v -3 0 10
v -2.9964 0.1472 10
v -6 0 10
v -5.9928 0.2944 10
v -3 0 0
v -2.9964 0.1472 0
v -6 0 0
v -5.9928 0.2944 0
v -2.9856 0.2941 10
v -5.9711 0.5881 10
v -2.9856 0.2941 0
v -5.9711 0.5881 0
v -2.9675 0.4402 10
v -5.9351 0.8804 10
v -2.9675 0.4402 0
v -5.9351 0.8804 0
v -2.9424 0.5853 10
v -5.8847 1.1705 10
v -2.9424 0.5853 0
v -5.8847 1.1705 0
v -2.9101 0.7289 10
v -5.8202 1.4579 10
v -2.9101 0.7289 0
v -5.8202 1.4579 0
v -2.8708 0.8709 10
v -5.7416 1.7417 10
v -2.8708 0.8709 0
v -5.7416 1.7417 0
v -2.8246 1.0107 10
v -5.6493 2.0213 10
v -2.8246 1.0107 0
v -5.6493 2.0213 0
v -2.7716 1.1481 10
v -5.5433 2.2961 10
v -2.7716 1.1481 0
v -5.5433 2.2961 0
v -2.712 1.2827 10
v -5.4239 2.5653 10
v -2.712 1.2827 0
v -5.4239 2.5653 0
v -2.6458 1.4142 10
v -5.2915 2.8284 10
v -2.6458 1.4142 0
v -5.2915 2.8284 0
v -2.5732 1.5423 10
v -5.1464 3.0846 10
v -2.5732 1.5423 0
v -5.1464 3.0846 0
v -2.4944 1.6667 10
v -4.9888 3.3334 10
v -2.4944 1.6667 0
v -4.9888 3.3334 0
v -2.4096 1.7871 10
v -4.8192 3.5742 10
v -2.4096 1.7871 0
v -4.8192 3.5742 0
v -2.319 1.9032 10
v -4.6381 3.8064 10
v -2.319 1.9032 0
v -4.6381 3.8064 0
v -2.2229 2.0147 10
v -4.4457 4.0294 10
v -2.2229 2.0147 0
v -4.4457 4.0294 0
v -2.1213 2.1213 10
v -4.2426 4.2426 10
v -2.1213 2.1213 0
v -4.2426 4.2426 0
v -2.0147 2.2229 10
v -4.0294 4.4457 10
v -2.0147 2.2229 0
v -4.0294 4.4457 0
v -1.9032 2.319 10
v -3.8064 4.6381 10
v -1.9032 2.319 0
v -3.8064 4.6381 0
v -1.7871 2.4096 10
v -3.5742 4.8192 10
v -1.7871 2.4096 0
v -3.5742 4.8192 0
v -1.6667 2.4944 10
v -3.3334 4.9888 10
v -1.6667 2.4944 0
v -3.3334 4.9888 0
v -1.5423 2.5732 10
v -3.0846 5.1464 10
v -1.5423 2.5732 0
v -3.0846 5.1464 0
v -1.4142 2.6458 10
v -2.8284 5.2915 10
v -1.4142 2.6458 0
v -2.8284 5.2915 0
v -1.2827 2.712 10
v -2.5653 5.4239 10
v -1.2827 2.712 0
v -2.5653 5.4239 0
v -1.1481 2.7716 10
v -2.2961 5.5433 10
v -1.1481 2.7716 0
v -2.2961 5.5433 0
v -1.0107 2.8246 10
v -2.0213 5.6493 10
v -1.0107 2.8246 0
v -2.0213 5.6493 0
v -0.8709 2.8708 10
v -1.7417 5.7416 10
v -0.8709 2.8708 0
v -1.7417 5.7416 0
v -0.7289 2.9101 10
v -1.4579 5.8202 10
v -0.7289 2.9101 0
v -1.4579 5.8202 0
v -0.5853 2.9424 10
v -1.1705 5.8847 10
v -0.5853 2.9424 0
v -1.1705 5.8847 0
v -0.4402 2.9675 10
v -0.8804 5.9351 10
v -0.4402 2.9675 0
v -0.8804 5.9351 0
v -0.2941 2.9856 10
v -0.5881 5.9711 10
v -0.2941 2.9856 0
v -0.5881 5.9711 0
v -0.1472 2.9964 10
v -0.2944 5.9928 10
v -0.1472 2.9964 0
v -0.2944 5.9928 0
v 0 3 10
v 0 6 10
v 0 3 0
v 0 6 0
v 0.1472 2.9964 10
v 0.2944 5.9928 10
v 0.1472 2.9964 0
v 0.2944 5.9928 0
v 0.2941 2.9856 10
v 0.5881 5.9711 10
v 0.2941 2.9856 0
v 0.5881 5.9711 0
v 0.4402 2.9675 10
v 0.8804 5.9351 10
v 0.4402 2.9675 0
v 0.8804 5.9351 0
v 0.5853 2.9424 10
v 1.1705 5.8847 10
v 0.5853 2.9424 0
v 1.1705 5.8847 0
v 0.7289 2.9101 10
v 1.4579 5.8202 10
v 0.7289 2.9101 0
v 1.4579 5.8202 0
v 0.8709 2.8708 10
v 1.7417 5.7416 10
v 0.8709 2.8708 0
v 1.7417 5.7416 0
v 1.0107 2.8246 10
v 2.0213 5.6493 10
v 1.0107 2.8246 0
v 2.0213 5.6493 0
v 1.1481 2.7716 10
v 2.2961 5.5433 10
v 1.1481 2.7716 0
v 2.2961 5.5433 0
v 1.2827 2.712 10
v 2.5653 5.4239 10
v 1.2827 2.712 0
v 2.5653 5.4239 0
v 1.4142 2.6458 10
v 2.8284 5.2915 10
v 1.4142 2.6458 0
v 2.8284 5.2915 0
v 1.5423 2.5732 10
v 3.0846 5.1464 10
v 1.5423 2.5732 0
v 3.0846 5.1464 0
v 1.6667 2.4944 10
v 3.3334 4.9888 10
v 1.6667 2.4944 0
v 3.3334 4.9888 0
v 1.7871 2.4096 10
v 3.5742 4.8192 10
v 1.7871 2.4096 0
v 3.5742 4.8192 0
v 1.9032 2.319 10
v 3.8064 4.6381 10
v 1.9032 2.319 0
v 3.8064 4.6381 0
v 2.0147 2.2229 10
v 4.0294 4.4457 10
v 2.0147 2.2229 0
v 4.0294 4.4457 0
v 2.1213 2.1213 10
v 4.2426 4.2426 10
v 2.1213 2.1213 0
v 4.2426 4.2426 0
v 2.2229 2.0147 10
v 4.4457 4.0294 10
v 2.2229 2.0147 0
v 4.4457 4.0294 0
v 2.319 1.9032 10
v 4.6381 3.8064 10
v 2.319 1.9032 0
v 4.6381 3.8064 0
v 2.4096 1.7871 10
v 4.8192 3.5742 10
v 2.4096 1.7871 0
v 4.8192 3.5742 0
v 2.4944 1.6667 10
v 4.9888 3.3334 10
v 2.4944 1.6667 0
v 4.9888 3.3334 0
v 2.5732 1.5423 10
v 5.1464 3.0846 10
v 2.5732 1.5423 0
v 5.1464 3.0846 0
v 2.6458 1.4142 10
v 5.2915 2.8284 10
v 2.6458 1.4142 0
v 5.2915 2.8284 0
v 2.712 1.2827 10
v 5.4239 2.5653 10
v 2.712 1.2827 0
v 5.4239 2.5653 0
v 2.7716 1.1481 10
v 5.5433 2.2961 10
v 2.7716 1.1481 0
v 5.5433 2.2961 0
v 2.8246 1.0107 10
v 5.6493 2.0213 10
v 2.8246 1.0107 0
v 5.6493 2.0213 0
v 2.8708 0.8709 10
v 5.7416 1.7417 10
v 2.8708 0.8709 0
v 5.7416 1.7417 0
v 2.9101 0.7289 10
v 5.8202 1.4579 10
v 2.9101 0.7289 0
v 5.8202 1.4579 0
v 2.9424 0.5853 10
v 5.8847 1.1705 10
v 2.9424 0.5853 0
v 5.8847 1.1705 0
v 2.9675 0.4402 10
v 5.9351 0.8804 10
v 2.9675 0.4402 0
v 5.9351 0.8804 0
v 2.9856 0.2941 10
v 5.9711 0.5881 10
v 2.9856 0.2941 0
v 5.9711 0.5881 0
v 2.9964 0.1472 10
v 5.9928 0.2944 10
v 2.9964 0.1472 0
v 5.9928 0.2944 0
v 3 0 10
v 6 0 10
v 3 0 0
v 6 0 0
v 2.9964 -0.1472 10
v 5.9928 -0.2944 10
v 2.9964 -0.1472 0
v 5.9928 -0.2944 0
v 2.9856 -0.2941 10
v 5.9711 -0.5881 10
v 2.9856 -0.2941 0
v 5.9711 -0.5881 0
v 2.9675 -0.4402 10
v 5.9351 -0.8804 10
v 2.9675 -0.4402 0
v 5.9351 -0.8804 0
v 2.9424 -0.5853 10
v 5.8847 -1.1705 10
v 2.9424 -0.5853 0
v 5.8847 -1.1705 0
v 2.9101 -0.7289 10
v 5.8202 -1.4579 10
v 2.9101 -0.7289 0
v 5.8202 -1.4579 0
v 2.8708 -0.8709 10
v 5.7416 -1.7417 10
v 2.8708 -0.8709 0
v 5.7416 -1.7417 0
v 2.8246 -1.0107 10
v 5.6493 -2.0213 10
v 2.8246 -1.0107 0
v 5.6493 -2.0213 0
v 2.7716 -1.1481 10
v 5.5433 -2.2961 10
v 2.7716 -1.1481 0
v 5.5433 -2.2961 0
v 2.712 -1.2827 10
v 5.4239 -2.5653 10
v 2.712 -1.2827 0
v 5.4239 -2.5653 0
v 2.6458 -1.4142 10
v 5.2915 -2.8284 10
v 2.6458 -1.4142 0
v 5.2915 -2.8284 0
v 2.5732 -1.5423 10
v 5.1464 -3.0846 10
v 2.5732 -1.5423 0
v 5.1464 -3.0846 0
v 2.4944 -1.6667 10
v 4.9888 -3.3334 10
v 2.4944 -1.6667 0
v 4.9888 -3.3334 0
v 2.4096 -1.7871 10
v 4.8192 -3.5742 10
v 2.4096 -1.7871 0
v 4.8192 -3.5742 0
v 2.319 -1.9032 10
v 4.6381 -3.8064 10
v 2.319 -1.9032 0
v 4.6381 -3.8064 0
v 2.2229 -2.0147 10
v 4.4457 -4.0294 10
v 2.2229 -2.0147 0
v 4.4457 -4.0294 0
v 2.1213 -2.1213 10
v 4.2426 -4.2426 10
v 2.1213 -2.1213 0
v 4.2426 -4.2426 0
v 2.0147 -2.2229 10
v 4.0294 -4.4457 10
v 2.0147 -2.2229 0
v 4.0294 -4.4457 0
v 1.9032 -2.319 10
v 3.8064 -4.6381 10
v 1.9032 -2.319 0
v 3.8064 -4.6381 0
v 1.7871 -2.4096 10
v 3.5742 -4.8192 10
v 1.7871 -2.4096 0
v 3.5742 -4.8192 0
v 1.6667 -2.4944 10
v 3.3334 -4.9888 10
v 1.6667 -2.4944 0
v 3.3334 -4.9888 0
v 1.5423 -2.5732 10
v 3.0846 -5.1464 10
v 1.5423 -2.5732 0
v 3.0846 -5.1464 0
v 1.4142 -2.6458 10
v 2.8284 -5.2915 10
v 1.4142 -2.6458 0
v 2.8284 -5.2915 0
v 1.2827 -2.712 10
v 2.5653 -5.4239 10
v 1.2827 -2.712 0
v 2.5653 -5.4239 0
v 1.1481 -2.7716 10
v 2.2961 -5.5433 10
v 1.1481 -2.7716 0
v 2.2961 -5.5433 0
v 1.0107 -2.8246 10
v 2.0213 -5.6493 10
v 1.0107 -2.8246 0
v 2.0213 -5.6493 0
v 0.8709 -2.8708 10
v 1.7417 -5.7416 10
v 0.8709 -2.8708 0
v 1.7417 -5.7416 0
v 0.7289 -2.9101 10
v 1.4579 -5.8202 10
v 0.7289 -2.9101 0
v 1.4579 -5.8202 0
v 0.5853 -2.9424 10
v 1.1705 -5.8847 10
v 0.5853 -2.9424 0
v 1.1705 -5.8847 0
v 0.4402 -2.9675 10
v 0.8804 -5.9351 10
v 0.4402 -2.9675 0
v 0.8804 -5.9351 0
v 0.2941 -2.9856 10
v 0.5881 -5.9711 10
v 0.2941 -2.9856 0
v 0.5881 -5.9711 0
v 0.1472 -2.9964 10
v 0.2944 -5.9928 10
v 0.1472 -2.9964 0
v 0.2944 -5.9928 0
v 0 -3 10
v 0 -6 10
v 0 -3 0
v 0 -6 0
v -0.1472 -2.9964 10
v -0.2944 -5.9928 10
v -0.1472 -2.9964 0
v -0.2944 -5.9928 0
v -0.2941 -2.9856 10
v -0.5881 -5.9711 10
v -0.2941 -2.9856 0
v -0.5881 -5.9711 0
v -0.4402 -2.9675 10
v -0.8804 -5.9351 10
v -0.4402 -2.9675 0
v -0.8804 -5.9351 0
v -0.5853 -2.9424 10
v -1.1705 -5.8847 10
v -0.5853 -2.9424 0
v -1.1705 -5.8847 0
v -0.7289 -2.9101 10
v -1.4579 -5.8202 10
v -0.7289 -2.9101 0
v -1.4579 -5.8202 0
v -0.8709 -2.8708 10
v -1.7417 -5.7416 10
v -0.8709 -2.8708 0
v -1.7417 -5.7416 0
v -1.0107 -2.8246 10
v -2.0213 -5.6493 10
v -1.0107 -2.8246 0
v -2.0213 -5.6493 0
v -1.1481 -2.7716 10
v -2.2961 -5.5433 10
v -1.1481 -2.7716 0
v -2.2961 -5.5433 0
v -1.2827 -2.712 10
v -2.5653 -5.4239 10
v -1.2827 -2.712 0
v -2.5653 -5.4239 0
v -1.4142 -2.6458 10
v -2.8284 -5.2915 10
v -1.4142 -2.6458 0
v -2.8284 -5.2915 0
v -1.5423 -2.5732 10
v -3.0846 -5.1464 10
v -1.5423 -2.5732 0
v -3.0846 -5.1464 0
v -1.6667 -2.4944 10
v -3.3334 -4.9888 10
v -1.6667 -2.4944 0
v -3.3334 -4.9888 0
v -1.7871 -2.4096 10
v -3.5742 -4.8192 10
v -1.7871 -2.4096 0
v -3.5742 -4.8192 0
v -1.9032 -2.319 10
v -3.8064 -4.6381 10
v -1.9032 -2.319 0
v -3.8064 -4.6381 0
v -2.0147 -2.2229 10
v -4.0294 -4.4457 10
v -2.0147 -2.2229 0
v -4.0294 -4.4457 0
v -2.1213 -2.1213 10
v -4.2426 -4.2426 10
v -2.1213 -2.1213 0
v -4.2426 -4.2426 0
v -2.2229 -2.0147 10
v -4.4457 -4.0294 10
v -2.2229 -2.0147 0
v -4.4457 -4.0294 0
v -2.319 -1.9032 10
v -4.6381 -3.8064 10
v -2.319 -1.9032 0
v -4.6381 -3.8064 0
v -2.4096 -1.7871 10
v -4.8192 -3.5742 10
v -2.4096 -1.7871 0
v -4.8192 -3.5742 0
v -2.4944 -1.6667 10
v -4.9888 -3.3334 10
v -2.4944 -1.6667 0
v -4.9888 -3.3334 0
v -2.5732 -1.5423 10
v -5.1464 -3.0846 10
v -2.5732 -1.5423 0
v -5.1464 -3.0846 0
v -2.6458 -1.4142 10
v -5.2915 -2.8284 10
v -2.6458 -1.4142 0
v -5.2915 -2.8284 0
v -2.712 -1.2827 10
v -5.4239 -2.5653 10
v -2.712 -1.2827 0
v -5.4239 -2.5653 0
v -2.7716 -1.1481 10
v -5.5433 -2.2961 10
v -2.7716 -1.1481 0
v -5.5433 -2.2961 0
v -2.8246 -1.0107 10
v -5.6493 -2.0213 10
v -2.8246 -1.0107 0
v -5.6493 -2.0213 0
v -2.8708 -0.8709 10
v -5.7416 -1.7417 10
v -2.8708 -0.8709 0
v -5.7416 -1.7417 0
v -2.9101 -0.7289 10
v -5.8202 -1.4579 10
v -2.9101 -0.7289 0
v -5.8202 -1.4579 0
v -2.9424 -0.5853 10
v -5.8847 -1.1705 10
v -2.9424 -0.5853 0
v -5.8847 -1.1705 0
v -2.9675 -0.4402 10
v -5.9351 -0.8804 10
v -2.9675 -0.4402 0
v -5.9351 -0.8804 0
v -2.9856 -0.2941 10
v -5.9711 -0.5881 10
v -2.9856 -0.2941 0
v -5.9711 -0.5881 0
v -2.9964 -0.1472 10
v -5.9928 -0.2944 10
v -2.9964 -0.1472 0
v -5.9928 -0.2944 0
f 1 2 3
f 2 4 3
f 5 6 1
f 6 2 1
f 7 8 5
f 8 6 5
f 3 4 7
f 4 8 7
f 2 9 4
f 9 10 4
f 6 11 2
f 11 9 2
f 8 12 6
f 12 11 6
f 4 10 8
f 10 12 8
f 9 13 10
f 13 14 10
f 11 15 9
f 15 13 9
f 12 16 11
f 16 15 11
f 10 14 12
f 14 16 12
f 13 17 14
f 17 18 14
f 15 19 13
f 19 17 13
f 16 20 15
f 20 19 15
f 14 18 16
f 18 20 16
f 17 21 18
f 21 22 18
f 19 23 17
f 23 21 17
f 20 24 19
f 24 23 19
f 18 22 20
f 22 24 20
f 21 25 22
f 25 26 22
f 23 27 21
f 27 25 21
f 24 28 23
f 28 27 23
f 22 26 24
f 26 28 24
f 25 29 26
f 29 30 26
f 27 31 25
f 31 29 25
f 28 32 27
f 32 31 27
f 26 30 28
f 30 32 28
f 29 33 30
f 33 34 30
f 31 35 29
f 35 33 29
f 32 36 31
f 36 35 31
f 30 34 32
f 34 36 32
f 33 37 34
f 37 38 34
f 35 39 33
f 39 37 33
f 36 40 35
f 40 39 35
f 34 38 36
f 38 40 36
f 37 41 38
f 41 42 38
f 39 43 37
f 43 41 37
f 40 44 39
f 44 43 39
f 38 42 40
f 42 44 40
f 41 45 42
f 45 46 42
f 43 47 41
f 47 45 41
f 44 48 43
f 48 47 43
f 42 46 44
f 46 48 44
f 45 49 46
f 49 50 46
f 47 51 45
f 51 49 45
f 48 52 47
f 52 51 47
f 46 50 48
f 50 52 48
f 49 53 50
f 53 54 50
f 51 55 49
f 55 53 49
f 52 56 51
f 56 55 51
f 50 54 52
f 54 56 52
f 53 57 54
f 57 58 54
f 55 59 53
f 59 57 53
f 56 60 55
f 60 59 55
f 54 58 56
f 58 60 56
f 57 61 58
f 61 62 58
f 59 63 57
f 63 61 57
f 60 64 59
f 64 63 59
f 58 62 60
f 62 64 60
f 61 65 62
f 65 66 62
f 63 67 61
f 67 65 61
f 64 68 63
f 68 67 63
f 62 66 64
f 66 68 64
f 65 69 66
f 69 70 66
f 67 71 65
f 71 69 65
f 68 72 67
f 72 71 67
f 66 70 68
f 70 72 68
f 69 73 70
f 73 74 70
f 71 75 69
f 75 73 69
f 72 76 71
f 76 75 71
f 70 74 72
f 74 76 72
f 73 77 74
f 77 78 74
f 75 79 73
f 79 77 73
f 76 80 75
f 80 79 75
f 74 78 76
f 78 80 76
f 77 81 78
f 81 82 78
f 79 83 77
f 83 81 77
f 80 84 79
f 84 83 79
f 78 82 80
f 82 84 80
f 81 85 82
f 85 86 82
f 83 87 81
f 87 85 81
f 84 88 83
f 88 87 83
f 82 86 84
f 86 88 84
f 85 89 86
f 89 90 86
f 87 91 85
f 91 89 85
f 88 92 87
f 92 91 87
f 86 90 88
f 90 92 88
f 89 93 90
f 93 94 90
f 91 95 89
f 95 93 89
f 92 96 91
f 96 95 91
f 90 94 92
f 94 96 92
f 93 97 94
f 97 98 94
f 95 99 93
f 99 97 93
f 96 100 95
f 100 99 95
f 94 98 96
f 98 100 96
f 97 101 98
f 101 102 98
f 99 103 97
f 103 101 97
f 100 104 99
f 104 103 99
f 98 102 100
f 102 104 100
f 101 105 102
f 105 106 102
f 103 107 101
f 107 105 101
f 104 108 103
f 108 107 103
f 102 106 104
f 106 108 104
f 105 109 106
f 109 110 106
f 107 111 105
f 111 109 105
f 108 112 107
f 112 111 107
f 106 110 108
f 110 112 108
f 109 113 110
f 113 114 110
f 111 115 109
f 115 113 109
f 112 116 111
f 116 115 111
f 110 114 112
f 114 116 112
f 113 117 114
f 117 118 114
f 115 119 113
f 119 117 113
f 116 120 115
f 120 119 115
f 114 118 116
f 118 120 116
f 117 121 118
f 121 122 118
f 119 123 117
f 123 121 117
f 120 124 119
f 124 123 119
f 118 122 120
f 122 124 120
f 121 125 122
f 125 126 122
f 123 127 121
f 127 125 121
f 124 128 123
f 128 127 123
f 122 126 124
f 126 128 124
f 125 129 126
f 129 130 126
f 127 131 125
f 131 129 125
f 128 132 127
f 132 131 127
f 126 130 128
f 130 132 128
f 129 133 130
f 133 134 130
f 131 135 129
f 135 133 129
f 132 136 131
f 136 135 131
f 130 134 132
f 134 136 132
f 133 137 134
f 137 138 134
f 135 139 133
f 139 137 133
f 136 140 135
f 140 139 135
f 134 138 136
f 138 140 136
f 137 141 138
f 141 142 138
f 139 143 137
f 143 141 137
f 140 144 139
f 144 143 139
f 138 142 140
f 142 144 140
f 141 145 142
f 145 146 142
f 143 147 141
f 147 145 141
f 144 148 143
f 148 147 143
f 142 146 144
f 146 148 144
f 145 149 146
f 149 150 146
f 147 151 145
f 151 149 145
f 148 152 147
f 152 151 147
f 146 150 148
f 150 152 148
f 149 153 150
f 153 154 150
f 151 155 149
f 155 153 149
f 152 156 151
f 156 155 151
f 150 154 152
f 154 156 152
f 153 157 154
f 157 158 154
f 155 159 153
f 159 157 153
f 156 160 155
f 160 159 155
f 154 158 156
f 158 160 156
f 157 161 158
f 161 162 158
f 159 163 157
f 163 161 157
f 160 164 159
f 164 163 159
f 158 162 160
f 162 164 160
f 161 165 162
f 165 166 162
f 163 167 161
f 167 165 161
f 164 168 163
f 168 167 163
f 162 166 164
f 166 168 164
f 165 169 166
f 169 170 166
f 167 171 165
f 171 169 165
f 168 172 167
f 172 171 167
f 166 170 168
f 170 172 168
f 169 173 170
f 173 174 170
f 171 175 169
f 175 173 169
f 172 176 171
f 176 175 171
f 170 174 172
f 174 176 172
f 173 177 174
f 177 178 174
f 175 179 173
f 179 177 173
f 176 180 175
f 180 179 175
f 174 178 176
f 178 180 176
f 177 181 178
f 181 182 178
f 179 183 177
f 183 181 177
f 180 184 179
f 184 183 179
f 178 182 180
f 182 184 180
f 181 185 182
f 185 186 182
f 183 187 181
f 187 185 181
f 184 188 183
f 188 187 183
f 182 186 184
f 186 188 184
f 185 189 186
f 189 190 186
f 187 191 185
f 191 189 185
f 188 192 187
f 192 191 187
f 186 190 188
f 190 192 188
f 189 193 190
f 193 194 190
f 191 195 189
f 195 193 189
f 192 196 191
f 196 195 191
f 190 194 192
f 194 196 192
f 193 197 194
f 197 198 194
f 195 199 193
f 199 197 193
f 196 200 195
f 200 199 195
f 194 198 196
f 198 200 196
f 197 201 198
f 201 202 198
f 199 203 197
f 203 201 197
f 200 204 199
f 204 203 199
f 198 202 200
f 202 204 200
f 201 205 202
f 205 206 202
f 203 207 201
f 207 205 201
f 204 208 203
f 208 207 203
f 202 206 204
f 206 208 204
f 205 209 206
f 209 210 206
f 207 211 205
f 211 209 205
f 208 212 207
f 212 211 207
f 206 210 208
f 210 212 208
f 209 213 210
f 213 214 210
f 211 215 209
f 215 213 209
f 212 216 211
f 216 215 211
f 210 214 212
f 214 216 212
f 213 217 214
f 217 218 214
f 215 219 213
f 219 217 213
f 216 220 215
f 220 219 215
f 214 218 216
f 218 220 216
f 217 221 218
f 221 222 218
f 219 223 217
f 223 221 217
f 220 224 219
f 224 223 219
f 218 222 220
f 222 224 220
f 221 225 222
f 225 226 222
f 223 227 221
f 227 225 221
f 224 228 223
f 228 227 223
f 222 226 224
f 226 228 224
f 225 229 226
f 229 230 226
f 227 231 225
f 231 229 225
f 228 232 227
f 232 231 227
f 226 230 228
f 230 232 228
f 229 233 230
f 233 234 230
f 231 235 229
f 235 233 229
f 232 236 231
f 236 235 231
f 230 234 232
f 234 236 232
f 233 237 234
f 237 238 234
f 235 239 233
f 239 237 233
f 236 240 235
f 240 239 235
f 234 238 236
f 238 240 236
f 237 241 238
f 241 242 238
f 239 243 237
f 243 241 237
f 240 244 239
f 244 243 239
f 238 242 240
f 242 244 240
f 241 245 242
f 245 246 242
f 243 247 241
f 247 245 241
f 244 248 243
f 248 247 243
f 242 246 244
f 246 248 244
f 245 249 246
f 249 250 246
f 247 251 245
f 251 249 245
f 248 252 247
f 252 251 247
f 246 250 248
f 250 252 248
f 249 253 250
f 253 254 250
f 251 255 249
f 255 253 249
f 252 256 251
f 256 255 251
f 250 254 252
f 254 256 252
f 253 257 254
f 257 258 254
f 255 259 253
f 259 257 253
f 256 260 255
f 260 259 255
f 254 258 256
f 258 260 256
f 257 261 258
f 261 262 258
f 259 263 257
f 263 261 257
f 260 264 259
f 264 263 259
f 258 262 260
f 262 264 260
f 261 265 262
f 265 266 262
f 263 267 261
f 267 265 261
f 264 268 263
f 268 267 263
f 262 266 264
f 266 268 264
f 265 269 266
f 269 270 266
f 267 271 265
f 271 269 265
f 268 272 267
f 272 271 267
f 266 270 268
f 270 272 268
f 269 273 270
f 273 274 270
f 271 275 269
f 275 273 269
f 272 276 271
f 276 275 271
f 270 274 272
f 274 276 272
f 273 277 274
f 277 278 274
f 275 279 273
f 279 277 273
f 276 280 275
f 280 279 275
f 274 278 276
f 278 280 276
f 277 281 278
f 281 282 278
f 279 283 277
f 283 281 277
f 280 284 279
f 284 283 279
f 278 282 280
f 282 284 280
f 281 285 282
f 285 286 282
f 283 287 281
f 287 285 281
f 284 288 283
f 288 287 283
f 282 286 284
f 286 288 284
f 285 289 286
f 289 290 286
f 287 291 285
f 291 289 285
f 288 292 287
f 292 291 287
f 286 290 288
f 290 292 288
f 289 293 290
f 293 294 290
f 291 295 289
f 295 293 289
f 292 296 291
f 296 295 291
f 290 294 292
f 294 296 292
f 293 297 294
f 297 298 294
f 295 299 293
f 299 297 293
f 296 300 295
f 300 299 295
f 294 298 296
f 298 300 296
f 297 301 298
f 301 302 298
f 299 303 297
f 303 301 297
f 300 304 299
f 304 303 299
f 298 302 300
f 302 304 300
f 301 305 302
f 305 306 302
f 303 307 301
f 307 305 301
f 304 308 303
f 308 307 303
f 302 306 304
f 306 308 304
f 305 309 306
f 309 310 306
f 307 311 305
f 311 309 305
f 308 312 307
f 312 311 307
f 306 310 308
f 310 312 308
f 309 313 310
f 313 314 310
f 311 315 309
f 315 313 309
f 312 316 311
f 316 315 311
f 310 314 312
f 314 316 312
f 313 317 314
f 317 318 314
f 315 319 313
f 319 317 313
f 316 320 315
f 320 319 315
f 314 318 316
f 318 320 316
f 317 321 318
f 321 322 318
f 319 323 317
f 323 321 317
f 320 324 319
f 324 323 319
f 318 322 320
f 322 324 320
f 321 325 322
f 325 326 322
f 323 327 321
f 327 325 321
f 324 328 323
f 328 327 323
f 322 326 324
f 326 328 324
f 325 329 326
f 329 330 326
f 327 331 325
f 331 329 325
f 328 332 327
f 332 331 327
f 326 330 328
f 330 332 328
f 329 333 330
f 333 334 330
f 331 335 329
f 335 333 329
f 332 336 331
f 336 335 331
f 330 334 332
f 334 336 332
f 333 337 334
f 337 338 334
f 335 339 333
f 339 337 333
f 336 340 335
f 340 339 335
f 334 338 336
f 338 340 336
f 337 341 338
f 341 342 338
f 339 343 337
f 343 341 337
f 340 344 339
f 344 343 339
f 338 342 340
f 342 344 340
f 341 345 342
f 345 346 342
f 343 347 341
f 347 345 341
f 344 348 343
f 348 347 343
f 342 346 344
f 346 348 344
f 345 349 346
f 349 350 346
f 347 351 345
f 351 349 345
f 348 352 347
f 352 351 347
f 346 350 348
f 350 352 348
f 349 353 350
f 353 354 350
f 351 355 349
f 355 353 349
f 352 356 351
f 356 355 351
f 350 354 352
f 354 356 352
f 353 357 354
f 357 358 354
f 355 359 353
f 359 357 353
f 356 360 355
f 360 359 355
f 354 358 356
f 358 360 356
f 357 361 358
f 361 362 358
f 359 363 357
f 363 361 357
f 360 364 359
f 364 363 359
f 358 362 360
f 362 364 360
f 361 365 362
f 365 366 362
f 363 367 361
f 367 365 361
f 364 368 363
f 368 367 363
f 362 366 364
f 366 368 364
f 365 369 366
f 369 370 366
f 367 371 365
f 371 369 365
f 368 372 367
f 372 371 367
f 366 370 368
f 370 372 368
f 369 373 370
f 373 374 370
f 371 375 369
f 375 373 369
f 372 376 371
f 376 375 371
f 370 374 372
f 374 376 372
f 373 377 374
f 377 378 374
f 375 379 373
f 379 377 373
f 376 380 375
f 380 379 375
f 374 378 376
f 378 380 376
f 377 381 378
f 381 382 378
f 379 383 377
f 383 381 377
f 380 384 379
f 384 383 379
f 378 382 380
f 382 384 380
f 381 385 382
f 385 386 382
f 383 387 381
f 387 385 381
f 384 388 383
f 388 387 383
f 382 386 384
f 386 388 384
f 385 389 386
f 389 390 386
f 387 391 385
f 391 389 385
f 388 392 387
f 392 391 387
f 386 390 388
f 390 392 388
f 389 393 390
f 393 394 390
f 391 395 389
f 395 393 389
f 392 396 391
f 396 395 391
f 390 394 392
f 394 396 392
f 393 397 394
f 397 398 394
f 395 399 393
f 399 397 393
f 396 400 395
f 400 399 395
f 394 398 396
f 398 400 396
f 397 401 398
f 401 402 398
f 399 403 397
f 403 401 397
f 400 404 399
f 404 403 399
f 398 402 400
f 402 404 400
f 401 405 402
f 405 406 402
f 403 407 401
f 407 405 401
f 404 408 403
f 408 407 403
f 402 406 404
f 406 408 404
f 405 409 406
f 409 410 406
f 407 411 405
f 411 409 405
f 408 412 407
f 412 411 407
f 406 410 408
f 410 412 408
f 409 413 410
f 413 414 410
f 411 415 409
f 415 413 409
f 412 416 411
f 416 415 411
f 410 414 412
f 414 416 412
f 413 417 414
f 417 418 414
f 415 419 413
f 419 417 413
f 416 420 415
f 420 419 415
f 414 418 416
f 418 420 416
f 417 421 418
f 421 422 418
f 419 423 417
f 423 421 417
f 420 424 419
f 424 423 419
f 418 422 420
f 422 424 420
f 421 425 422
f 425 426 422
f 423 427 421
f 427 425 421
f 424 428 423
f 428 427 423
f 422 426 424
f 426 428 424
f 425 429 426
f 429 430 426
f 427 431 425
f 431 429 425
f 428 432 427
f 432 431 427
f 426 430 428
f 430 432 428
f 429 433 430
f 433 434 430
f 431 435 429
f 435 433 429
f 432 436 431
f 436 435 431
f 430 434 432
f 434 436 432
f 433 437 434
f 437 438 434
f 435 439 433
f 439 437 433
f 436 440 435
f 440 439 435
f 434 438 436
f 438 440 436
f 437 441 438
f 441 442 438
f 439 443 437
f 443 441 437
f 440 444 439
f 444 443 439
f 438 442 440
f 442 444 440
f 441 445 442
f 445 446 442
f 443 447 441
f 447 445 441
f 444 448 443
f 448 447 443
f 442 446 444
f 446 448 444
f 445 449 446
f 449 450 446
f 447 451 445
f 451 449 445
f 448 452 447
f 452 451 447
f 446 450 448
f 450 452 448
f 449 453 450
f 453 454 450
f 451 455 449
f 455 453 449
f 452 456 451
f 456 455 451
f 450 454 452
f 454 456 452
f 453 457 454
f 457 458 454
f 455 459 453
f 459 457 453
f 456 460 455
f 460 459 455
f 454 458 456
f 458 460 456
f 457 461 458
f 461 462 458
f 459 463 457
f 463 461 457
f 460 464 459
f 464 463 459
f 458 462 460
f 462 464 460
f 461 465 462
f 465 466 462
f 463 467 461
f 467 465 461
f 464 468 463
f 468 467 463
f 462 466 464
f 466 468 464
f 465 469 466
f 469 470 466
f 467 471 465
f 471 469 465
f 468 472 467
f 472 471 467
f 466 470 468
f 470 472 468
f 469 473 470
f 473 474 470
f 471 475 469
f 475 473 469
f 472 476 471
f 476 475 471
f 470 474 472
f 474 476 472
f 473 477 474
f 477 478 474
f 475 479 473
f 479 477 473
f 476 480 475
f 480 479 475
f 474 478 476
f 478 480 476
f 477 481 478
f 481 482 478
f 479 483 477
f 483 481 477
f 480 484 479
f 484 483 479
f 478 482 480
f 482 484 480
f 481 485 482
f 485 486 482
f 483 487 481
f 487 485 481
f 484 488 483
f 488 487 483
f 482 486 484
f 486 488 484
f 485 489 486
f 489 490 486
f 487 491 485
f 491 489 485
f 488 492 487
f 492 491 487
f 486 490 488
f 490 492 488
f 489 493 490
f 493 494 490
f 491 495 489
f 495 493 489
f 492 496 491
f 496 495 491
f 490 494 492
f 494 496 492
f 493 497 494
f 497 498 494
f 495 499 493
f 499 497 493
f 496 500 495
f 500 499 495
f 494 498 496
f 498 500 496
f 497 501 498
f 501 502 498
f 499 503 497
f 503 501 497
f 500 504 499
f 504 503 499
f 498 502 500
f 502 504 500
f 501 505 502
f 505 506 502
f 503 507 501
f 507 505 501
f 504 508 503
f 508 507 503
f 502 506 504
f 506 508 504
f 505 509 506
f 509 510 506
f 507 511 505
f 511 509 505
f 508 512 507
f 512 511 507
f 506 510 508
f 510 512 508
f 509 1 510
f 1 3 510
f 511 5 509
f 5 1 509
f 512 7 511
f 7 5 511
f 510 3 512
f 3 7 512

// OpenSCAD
// Auto-generated from tests/data/feature_fixtures_manifest.json
// fixture: revolve_annular_tube
// fixture_type: revolve
// description: Annular tube (inner r=3, outer r=6, height=10) revolved around Z; Phase 1.6 annular revolve.
$fn = 96;

profile = [
    [3.000000, 0.000000],
    [6.000000, 0.000000],
    [6.000000, 10.000000],
    [3.000000, 10.000000]
];

rotate_extrude($fn=128) polygon(points=profile);
